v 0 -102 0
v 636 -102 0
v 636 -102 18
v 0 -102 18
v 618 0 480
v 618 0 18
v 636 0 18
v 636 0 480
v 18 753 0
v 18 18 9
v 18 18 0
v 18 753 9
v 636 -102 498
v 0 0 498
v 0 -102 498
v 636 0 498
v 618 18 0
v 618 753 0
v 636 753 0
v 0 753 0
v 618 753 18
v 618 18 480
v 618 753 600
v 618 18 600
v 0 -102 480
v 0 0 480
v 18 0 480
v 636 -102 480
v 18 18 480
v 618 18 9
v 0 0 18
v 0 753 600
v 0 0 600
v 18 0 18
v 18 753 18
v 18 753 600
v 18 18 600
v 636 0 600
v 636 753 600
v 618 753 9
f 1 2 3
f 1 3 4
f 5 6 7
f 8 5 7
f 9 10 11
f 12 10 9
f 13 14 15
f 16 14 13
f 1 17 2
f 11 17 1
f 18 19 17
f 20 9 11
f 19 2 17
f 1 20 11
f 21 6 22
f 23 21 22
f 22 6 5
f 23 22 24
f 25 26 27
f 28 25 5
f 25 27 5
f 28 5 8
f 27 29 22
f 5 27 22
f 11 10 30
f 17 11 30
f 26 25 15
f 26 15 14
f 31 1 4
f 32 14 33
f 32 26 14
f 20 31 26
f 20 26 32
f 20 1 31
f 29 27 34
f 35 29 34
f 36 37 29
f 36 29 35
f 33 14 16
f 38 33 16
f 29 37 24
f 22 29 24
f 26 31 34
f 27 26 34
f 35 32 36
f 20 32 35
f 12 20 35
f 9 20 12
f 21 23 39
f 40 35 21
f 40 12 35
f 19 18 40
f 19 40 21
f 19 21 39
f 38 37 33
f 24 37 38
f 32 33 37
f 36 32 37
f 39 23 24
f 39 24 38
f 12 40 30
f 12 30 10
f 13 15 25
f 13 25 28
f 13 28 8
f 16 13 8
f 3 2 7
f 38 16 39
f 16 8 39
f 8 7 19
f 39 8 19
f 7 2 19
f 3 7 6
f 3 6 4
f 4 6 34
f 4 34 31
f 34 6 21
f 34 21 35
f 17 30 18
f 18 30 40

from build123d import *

# Parameters (mm, degrees)
SKETCH2_W           = 636
SKETCH2_H           = 753
BOSS_EXTRUDE1_DEPTH = 600
SKETCH3_W           = 600
SKETCH3_H           = 735
CUT_EXTRUDE1_DEPTH  = 600
BOSS_EXTRUDE2_START = -18
SKETCH4_W           = 600
SKETCH4_H           = 735
BOSS_EXTRUDE2_DEPTH = 9
BOSS_EXTRUDE3_START = -102
SKETCH5_W           = 636
SKETCH5_H           = 102
BOSS_EXTRUDE3_DEPTH = 18
SKETCH6_W           = 636
SKETCH6_H           = 102
BOSS_EXTRUDE4_DEPTH = 18
CUT_EXTRUDE2_REACH  = 1155.909
SKETCH7_W           = 600
SKETCH7_H           = 462


with BuildPart() as part:
    # Sketch2 → Boss-Extrude1 (new body)
    with BuildSketch(Plane.XY):
        with Locations((318, 376.5)):
            Rectangle(SKETCH2_W, SKETCH2_H)
    extrude(amount=BOSS_EXTRUDE1_DEPTH)

    # Sketch3 → Cut-Extrude1 (cut)
    with BuildSketch(Plane.XY.offset(600)):
        with Locations((318, 385.5)):
            Rectangle(SKETCH3_W, SKETCH3_H)
    extrude(amount=-CUT_EXTRUDE1_DEPTH, mode=Mode.SUBTRACT)

    # Sketch4 → Boss-Extrude2 (add)
    with BuildSketch(Plane(origin=(0, 0, 0), x_dir=(-1, 0, 0), z_dir=(0, 0, -1)).offset(BOSS_EXTRUDE2_START)):
        with Locations((-318, 385.5)):
            Rectangle(SKETCH4_W, SKETCH4_H)
    extrude(amount=BOSS_EXTRUDE2_DEPTH)

    # Sketch5 → Boss-Extrude3 (add)
    with BuildSketch(Plane.XY.offset(600).offset(BOSS_EXTRUDE3_START)):
        with Locations((318, -51)):
            Rectangle(SKETCH5_W, SKETCH5_H)
    extrude(amount=-BOSS_EXTRUDE3_DEPTH)

    # Sketch6 → Boss-Extrude4 (add)
    with BuildSketch(Plane(origin=(0, 0, 0), x_dir=(-1, 0, 0), z_dir=(0, 0, -1))):
        with Locations((-318, -51)):
            Rectangle(SKETCH6_W, SKETCH6_H)
    extrude(amount=-BOSS_EXTRUDE4_DEPTH)

    # Sketch7 → Cut-Extrude2 (cut, up to next)
    with BuildSketch(Plane.XZ, mode=Mode.PRIVATE) as cut_extrude2_sk1:
        with Locations((318, 249)):
            Rectangle(SKETCH7_W, SKETCH7_H)
    cut_extrude2_tool1 = extrude(cut_extrude2_sk1.sketch, amount=-CUT_EXTRUDE2_REACH, mode=Mode.PRIVATE) & part.part
    add(cut_extrude2_tool1.solids().sort_by_distance((318, 0, 249))[0], mode=Mode.SUBTRACT)


solid = part.part
